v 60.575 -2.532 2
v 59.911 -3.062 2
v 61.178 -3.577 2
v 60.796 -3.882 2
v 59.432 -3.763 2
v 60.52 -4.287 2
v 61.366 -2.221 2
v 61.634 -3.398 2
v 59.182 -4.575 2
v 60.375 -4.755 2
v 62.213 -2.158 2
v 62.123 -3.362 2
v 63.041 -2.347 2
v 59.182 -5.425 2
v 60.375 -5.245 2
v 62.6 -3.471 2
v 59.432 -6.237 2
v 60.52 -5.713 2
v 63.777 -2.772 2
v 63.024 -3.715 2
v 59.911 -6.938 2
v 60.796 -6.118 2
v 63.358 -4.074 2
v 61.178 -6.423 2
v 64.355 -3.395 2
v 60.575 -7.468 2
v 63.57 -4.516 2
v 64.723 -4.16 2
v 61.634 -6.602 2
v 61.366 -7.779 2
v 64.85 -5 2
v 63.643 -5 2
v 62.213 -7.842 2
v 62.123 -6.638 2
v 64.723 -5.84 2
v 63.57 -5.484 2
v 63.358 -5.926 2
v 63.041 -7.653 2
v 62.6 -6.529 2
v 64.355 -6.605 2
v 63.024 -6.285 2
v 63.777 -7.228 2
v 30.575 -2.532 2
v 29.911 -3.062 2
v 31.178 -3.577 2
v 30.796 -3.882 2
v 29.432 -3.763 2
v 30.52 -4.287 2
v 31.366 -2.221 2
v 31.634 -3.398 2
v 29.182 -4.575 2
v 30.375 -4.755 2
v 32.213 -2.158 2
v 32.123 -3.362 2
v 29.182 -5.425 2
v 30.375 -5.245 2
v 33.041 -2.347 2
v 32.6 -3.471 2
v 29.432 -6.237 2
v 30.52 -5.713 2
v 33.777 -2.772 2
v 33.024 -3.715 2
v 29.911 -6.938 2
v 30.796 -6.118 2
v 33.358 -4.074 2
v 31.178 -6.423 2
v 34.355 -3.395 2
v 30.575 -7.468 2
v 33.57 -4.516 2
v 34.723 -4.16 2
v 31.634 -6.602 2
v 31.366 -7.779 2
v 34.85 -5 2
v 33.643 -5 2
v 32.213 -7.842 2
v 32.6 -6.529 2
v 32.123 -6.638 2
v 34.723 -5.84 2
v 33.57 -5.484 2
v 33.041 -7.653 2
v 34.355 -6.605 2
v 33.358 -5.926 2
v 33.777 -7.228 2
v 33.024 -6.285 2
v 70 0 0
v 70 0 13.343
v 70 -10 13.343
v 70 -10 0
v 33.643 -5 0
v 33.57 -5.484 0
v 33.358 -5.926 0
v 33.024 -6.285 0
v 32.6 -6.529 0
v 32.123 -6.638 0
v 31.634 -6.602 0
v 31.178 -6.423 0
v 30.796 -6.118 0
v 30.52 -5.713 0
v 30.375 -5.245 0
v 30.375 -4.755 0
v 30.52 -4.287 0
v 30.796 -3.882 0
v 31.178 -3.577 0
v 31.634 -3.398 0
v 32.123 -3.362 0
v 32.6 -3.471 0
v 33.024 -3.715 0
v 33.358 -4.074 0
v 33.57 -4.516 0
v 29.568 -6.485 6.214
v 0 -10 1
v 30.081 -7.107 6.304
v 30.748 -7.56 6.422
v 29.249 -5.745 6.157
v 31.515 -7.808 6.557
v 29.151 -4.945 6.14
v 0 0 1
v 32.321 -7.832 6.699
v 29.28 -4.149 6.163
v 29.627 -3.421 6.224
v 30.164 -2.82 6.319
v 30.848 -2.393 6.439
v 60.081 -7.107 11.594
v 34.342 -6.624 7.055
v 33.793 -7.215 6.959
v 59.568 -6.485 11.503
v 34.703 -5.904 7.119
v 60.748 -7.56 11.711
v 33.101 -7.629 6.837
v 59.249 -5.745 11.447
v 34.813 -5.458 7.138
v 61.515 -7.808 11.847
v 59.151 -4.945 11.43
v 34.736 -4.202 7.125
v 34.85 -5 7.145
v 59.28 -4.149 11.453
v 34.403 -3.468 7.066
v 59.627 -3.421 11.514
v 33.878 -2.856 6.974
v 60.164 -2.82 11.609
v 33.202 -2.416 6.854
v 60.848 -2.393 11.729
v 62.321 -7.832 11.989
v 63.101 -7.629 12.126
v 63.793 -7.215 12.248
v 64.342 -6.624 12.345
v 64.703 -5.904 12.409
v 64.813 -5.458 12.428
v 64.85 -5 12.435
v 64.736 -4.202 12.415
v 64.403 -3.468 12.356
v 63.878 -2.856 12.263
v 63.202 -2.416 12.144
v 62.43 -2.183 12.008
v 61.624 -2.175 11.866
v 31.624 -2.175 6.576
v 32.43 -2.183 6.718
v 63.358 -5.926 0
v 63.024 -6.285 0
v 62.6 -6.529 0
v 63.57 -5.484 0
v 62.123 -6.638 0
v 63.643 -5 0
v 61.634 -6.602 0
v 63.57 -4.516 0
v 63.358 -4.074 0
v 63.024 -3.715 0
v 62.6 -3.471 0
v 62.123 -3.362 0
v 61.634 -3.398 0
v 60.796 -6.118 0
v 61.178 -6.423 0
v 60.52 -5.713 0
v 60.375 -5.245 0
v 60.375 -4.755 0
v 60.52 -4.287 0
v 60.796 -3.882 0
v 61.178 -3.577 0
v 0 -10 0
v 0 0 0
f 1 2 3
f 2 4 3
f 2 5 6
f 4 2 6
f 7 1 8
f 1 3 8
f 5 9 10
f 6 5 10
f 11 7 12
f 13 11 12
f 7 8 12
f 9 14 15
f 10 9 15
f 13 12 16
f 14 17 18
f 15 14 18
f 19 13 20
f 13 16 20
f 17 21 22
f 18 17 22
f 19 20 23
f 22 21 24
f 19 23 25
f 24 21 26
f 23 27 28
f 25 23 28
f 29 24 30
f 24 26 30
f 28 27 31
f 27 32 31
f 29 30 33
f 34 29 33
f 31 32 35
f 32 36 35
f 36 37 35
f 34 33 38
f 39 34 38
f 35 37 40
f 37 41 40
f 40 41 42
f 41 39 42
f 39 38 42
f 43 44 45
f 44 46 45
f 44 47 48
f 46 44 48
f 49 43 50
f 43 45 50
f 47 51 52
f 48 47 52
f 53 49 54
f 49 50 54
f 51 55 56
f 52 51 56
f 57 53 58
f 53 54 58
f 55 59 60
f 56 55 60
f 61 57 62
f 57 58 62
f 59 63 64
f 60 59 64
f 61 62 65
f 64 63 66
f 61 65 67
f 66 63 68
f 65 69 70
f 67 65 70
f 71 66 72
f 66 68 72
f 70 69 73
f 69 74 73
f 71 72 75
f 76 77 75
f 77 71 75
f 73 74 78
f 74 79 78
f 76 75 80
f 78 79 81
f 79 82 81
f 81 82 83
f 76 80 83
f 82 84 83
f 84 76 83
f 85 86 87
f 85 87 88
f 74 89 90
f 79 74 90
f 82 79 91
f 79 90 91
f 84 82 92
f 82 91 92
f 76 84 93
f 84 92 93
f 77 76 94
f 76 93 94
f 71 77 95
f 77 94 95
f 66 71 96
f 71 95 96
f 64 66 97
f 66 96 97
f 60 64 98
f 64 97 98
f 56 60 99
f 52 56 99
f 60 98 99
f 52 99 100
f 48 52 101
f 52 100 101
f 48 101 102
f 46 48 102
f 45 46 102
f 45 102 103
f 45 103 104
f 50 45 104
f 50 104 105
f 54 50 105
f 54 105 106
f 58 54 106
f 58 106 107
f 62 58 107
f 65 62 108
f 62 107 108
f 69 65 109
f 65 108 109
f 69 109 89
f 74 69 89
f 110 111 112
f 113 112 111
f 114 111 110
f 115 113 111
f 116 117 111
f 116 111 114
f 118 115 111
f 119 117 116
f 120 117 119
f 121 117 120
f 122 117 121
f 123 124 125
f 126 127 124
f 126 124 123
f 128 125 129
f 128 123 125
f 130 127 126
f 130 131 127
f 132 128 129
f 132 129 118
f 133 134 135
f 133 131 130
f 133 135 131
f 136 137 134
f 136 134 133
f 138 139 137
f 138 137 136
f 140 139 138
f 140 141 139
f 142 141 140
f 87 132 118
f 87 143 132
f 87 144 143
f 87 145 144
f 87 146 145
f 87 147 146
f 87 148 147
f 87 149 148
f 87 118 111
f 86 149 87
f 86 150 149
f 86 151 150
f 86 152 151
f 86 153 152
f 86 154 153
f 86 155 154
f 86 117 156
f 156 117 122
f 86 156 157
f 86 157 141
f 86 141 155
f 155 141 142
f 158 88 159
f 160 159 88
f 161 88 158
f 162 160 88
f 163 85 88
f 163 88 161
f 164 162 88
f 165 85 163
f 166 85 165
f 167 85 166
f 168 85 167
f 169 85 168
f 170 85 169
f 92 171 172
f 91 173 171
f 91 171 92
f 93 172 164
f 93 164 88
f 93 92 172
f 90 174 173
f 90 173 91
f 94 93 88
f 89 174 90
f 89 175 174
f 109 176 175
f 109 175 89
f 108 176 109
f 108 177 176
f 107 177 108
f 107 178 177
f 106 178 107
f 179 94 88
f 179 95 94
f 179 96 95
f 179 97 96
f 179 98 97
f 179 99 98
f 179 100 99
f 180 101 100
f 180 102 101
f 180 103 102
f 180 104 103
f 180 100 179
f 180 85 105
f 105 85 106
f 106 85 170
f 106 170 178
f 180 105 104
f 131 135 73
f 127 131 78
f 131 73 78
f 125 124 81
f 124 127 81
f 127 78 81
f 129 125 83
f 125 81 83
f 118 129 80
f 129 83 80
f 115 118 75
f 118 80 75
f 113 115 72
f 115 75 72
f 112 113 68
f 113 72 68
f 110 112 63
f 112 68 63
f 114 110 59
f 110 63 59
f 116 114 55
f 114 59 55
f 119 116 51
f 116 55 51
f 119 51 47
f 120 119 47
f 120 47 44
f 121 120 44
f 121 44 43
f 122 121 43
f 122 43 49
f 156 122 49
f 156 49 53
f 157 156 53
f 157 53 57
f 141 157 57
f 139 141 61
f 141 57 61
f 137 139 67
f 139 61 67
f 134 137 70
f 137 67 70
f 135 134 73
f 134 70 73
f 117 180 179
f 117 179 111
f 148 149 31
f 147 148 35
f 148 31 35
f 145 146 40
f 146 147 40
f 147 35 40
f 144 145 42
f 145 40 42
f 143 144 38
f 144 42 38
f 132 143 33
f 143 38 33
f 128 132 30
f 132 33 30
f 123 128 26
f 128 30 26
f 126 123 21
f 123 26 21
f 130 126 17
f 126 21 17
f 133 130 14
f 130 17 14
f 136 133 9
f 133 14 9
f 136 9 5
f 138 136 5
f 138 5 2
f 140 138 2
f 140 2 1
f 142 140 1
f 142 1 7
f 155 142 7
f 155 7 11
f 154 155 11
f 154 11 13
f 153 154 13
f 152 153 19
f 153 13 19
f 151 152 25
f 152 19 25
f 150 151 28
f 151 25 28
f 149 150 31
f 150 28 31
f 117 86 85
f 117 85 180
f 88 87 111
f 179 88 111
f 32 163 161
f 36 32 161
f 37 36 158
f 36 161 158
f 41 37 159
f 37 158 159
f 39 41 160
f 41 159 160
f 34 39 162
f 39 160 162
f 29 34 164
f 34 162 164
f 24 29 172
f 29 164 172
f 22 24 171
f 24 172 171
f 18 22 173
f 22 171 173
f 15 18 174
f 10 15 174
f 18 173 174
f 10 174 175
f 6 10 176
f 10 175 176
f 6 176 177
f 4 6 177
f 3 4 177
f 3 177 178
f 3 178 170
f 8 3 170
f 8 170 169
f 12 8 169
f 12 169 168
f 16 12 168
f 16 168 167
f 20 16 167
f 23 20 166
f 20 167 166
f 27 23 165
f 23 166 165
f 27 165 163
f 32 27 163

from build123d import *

# Parameters (mm, degrees)
PAD_DEPTH     = 10
SKETCH002_R   = 2.85
POCKET_DEPTH  = 30
SKETCH003_R   = 3.5
SKETCH003_R_2 = 1.643
PAD001_DEPTH  = 2


with BuildPart() as part:
    # Sketch → Pad (new body)
    with BuildSketch(Plane.XZ):
        Polygon((0, 0), (0, 1), (70, 13.342889), (70, 0), align=None)
    extrude(amount=PAD_DEPTH)

    # Sketch002 (on Face4 of Pad) → Pocket (cut)
    with BuildSketch(Plane(origin=(0, 0, 0), x_dir=(1, 0, 0), z_dir=(0, 0, -1))):
        with Locations((32, 5)):
            Circle(SKETCH002_R)
        with Locations((62, 5)):
            Circle(SKETCH002_R)
    extrude(amount=-POCKET_DEPTH, mode=Mode.SUBTRACT)

    # Sketch003 (on Face2 of Pocket) → Pad001 (join)
    with BuildSketch(Plane(origin=(0, 0, 0), x_dir=(1, 0, 0), z_dir=(0, 0, -1))):
        with Locations((32, 5)):
            Circle(SKETCH003_R)
        with Locations((32, 5)):
            Circle(SKETCH003_R_2, mode=Mode.SUBTRACT)
        with Locations((62, 5)):
            Circle(SKETCH003_R)
        with Locations((62, 5)):
            Circle(SKETCH003_R_2, mode=Mode.SUBTRACT)
    extrude(amount=-PAD001_DEPTH)


solid = part.part
